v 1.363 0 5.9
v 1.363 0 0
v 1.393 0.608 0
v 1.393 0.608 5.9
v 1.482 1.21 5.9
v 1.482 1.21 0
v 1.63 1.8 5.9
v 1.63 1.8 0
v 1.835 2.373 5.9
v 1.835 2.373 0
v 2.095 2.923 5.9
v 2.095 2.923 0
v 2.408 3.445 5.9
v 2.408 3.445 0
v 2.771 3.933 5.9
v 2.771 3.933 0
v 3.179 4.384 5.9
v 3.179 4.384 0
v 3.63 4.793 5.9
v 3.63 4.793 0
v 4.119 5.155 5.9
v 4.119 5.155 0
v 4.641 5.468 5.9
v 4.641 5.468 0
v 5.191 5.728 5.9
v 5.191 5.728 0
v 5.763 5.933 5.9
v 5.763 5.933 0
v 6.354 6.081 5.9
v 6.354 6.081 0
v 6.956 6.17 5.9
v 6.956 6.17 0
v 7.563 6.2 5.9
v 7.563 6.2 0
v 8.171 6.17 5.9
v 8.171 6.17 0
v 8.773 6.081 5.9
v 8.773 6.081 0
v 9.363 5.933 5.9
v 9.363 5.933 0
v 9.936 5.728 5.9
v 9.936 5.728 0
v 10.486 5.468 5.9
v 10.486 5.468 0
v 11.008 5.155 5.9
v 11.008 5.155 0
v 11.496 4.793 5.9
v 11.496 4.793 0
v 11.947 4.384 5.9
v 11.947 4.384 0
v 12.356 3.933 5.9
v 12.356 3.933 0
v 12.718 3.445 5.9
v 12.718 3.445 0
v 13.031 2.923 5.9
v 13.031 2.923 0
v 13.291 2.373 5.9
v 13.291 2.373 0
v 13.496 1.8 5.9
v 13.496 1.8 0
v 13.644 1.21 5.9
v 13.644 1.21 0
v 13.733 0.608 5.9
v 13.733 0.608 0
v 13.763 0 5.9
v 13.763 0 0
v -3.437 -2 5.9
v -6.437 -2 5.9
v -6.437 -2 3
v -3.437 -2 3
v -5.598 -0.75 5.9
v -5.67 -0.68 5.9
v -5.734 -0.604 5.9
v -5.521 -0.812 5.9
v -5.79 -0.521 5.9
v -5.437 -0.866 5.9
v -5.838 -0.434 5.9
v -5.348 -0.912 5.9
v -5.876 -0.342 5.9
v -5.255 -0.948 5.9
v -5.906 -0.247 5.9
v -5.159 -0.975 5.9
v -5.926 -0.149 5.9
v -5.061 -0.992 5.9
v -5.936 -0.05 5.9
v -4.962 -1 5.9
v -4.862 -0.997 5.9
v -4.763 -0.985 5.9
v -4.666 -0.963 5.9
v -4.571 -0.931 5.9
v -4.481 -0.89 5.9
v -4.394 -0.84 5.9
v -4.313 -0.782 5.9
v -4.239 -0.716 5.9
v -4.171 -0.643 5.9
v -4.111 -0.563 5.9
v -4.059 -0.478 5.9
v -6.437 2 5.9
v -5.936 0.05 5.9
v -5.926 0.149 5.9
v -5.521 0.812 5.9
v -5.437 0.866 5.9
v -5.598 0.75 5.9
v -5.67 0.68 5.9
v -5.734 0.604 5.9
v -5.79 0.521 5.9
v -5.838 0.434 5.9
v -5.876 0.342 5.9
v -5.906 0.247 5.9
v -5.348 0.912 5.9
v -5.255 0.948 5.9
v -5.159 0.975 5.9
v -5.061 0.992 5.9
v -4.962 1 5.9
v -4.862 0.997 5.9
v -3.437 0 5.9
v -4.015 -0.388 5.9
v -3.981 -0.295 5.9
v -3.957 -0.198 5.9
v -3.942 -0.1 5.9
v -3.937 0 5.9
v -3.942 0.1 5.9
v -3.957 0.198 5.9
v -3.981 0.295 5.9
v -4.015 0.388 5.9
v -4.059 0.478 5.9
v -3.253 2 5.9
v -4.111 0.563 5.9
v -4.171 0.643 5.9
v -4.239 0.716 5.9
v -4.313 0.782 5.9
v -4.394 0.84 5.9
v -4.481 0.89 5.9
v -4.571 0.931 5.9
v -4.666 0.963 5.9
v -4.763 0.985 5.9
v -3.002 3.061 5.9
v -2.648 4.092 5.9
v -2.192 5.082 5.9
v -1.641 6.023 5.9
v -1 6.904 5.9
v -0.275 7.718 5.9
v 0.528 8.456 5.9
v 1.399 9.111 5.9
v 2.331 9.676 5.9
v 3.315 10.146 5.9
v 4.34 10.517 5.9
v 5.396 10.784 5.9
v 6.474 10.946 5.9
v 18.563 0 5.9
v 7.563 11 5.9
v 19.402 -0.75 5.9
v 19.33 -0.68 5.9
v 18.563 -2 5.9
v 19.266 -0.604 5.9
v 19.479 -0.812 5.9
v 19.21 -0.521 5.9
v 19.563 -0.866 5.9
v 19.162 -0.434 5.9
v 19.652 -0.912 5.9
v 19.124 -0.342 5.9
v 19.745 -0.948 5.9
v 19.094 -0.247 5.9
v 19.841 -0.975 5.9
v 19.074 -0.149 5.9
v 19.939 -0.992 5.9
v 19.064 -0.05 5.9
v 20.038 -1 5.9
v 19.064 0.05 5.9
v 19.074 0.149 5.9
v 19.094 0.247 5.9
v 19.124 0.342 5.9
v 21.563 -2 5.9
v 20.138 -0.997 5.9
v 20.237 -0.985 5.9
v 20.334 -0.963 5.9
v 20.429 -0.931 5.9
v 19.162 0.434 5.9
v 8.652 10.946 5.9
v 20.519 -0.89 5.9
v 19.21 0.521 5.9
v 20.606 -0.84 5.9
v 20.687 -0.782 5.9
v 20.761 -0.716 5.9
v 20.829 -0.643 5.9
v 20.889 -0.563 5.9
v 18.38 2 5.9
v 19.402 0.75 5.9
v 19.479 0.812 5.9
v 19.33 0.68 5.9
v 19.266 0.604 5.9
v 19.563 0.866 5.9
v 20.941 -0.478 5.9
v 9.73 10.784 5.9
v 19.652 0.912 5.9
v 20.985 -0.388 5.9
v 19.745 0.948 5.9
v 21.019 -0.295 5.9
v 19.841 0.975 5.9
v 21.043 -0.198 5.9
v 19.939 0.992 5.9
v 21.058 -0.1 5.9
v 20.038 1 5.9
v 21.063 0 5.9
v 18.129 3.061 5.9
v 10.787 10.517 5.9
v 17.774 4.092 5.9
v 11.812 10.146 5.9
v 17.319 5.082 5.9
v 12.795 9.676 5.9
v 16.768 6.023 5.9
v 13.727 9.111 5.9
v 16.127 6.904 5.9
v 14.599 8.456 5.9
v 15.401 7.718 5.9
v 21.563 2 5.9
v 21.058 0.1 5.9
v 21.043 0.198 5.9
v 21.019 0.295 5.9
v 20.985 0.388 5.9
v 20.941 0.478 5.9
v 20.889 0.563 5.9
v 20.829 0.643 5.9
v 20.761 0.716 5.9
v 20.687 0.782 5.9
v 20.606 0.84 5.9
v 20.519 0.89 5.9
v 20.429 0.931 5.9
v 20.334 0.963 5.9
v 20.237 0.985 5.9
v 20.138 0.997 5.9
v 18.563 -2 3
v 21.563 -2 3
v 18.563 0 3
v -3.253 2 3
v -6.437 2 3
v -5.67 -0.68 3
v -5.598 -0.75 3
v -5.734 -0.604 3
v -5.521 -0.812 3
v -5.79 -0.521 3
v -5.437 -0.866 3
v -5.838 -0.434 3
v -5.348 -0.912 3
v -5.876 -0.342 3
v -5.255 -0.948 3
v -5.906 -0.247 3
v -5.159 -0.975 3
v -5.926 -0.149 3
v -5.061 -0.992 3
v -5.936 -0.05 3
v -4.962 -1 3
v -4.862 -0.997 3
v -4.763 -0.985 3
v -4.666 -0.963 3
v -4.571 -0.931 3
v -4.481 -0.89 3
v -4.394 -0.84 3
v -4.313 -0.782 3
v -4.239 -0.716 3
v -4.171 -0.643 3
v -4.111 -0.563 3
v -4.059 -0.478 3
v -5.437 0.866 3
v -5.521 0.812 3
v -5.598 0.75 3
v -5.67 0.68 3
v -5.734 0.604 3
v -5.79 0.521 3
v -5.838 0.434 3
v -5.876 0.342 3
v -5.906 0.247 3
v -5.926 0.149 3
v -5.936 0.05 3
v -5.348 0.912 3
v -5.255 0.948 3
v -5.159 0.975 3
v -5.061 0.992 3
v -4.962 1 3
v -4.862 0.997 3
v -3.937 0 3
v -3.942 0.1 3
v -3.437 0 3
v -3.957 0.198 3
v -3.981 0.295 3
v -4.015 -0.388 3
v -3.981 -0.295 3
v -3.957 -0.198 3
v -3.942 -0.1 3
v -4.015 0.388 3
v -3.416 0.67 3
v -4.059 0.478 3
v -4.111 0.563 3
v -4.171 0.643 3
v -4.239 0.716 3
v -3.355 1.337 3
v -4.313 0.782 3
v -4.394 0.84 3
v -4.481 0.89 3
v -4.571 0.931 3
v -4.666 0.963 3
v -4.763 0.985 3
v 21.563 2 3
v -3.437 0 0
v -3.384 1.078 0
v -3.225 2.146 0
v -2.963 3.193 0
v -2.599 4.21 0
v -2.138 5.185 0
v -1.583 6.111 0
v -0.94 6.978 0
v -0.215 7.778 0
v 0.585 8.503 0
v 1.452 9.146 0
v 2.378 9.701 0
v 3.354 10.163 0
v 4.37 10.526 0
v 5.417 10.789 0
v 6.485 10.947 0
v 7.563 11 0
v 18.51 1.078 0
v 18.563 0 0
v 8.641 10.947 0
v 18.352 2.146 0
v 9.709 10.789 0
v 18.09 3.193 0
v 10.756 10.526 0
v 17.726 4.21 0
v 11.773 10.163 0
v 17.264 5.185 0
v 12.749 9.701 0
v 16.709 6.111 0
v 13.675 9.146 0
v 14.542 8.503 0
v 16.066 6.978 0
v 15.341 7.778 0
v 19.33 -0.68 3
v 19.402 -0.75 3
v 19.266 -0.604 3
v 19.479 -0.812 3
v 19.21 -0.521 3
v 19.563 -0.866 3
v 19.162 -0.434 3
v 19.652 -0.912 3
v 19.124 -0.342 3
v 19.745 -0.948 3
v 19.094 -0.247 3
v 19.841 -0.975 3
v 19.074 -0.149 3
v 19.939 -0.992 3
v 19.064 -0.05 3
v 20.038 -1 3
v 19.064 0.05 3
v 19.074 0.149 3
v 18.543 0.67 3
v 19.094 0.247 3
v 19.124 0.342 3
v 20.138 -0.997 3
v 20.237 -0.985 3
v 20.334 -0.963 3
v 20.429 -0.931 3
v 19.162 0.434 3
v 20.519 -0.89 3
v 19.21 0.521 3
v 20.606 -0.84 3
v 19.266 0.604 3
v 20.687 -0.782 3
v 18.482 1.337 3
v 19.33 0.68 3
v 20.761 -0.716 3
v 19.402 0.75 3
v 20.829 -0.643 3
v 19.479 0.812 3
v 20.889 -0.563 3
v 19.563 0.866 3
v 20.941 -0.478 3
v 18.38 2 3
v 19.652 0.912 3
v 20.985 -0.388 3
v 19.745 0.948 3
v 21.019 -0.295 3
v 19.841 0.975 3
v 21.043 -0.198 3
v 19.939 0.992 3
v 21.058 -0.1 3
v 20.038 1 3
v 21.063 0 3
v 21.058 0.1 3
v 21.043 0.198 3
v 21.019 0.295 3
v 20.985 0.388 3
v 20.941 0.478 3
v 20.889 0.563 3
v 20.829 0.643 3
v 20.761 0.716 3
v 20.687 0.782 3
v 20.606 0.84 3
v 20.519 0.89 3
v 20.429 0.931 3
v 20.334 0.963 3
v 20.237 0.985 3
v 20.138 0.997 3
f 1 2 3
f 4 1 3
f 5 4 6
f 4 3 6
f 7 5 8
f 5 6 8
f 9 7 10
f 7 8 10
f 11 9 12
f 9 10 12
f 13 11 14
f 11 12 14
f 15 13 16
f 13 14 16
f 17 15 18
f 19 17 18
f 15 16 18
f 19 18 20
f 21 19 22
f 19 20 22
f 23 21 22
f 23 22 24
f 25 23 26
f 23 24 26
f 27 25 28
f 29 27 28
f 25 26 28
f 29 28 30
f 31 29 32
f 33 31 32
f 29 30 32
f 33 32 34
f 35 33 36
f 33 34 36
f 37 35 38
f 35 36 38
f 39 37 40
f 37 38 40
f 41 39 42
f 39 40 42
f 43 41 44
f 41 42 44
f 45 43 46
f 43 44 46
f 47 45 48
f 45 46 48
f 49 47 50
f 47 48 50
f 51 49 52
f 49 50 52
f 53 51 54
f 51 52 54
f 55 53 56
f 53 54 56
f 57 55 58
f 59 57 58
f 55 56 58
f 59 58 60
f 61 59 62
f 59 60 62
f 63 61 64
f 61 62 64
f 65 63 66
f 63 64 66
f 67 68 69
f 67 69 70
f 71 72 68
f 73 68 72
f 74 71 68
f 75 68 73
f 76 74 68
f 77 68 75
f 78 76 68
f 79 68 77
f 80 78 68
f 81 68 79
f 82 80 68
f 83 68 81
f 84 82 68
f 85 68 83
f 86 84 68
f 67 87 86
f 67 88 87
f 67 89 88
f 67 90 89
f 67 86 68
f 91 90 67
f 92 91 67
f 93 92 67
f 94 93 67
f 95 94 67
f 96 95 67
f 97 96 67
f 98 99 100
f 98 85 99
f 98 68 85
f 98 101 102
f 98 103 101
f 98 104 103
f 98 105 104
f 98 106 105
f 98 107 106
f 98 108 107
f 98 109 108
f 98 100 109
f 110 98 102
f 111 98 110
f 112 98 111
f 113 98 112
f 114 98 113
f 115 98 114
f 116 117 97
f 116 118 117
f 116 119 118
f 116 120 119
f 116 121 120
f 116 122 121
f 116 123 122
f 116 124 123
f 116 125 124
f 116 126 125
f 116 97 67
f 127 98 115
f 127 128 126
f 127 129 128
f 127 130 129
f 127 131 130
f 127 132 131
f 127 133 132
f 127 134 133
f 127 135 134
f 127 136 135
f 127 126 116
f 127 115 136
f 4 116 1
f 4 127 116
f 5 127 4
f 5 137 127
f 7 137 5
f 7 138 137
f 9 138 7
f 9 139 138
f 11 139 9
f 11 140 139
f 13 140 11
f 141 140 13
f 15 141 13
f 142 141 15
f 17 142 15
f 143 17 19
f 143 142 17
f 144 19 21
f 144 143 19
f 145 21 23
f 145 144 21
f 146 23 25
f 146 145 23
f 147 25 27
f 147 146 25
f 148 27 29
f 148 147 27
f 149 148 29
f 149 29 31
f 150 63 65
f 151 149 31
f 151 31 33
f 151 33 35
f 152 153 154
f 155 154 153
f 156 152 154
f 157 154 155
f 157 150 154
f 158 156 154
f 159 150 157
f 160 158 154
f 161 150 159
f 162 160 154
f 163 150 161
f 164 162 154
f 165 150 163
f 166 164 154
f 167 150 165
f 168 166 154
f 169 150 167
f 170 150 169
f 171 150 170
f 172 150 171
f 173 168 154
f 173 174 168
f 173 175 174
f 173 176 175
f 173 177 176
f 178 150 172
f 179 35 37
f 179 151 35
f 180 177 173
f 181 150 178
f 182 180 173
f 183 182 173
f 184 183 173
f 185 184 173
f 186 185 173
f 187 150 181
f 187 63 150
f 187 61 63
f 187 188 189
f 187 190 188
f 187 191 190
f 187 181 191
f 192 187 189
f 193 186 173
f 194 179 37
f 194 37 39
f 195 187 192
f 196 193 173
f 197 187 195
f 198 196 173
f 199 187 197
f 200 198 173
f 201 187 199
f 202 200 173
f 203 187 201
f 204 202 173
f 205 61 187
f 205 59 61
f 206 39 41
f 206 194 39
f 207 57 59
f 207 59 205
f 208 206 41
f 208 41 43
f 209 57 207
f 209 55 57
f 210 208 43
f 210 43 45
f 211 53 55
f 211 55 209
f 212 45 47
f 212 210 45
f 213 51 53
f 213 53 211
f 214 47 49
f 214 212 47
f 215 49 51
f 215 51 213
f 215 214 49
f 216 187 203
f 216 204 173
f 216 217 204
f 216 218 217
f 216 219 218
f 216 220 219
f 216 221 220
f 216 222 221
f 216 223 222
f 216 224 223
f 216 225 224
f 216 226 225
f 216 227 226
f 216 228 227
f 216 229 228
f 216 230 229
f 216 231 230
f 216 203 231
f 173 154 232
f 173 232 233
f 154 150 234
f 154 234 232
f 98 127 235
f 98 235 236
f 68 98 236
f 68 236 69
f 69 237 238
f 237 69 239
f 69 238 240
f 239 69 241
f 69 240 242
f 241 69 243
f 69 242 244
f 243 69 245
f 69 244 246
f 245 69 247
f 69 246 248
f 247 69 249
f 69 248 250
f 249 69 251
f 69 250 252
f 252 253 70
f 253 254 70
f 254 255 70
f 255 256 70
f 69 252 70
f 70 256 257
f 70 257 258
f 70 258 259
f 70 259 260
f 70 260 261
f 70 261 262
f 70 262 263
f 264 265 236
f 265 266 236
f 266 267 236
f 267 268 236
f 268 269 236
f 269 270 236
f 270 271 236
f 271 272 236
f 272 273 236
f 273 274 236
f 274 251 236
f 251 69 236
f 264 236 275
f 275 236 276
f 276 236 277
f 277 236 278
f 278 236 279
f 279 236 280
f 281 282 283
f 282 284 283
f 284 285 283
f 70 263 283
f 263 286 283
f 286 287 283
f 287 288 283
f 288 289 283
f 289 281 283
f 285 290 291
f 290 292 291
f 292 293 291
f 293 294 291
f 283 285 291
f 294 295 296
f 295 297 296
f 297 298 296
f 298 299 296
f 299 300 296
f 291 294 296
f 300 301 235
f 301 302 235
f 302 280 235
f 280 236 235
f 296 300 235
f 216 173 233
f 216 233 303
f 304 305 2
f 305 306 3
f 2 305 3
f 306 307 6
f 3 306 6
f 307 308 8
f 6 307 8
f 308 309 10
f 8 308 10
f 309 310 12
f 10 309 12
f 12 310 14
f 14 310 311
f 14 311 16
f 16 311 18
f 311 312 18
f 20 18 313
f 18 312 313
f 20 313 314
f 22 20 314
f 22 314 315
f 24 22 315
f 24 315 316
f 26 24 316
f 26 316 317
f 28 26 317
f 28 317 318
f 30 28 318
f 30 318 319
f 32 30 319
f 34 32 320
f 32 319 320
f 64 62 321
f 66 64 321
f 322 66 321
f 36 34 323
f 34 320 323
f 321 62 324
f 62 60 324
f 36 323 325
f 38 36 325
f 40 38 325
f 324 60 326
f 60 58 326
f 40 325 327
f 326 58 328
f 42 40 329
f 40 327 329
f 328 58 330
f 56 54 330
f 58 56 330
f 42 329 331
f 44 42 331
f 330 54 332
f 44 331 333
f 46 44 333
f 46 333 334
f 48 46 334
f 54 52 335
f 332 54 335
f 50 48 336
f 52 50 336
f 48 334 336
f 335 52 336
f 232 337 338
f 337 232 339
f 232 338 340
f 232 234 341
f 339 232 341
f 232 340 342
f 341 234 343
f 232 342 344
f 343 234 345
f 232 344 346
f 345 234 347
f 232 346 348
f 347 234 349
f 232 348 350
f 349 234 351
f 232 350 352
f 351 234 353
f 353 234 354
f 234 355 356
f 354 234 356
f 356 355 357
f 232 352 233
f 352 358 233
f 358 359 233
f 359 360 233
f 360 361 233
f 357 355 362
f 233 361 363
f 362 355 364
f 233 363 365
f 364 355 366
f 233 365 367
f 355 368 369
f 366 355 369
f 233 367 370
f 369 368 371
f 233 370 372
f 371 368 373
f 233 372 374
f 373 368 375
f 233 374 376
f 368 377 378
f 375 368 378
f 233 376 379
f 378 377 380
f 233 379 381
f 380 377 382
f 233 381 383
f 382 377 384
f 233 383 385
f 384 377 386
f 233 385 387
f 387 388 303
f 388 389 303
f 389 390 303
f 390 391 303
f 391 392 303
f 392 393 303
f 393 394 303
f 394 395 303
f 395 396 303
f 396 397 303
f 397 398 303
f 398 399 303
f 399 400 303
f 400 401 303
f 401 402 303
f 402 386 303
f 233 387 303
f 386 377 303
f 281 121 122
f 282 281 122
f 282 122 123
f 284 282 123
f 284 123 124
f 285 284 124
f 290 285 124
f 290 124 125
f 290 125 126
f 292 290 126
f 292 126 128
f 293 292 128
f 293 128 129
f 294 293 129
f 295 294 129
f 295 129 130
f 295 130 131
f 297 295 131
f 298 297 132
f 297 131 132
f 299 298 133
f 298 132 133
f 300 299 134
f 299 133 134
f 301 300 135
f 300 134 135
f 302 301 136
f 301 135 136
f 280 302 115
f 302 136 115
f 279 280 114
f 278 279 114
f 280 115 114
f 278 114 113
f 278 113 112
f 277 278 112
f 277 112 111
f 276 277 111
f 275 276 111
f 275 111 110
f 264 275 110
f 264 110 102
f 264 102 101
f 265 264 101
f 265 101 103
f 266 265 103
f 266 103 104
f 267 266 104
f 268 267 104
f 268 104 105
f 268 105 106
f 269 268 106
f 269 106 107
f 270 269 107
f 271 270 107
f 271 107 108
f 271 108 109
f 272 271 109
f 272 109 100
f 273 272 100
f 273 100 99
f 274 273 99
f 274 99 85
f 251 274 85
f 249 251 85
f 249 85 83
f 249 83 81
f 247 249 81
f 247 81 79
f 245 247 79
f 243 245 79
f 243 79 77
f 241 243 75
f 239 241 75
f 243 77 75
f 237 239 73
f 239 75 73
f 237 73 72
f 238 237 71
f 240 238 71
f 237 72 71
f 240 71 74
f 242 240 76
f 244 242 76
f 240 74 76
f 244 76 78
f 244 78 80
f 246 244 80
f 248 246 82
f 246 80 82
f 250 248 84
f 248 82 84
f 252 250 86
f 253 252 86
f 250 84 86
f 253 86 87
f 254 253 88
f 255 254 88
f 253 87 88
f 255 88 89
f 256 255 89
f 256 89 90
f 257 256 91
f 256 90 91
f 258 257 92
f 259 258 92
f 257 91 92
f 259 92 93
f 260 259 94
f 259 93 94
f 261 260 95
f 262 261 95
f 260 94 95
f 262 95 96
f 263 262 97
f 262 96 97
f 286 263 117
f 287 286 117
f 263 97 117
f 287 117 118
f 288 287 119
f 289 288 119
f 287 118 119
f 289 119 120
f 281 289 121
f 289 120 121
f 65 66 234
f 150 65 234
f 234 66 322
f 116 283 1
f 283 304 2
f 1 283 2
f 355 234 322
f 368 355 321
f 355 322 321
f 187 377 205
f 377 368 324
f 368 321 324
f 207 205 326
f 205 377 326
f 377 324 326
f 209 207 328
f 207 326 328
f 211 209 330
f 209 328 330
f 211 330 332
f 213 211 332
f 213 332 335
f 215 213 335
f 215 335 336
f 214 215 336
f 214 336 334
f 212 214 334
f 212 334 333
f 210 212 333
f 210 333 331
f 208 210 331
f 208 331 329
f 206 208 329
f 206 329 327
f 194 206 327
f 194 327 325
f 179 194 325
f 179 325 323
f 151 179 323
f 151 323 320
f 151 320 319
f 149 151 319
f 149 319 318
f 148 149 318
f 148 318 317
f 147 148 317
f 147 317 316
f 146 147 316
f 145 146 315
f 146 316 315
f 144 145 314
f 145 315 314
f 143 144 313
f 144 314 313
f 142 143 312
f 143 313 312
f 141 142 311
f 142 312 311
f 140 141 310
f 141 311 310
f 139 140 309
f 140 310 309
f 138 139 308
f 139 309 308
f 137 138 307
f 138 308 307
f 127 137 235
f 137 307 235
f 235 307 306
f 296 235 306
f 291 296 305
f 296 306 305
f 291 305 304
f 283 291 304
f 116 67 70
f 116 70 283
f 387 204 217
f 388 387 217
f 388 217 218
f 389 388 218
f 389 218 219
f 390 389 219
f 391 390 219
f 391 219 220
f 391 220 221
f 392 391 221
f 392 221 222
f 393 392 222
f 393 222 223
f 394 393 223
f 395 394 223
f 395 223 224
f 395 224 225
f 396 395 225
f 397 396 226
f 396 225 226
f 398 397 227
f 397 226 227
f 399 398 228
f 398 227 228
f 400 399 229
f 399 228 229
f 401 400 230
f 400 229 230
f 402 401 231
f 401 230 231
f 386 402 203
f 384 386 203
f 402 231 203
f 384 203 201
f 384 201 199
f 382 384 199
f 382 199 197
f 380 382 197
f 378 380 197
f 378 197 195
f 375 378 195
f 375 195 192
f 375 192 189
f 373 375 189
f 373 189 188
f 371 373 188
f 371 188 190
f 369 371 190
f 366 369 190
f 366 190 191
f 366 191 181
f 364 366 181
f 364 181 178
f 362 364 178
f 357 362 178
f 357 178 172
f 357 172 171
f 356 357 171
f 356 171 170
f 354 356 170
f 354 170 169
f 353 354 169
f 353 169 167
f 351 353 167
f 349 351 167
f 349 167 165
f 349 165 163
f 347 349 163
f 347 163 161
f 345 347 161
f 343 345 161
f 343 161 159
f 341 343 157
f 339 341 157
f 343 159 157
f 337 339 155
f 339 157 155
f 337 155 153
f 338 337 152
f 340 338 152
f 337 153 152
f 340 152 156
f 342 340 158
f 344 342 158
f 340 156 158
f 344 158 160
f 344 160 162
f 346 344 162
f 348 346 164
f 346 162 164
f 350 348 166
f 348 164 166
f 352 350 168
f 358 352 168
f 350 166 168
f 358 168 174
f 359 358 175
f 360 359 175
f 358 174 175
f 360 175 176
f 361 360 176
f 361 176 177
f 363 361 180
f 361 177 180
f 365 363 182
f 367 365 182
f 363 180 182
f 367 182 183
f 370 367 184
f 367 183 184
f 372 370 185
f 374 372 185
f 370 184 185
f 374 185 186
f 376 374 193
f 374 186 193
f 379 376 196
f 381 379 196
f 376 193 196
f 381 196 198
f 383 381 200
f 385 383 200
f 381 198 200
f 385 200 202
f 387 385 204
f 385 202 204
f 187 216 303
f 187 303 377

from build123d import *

# Parameters (mm, degrees)
RESSALTO_EXTRUS_O1_DEPTH = 5.9
RESSALTO_EXTRUS_O2_DEPTH = 2.9
ESBO_O3_R                = 1
CORTE_EXTRUS_O1_DEPTH    = 6.5


with BuildPart() as part:
    # Esboço1 → Ressalto-extrusão1 (new body)
    with BuildSketch(Plane.XY):
        with BuildLine():
            ThreePointArc((18.563238972, 0), (7.563238972, 11), (-3.436761028, 0))
            Line((-3.436761028, 0), (1.363238972, 0))
            ThreePointArc((1.363238972, 0), (7.563238972, 6.2), (13.763238972, 0))
            Line((13.763238972, 0), (18.563238972, 0))
        make_face()
    extrude(amount=RESSALTO_EXTRUS_O1_DEPTH)

    # Esboço2 → Ressalto-extrusão2 (add)
    with BuildSketch(Plane.XY.offset(5.9)):
        with BuildLine():
            ThreePointArc((-3.436761028, 0), (-3.390828585, 1.004193186), (-3.253414854, 2))
            Line((-3.253414854, 2), (-6.436761028, 2))
            Line((-6.436761028, 2), (-6.436761028, -2))
            Line((-6.436761028, -2), (-3.436761028, -2))
            Line((-3.436761028, -2), (-3.436761028, 0))
        make_face()
        with BuildLine():
            Line((-0.436761028, 2), (-3.253414854, 2))
            ThreePointArc((-3.253414854, 2), (-3.390828585, 1.004193186), (-3.436761028, 0))
            Line((-3.436761028, 0), (-0.436761028, 0))
            Line((-0.436761028, 0), (-0.436761028, 2))
        make_face()
        with BuildLine():
            ThreePointArc((18.379892799, 2), (18.517306529, 1.004193186), (18.563238972, 0))
            Line((18.563238972, 0), (18.563238972, -2))
            Line((18.563238972, -2), (21.563238972, -2))
            Line((21.563238972, -2), (21.563238972, 2))
            Line((21.563238972, 2), (18.379892799, 2))
        make_face()
        with BuildLine():
            Line((15.563238972, 0), (18.563238972, 0))
            ThreePointArc((18.563238972, 0), (18.517306529, 1.004193186), (18.379892799, 2))
            Line((18.379892799, 2), (15.563238972, 2))
            Line((15.563238972, 2), (15.563238972, 0))
        make_face()
    extrude(amount=-RESSALTO_EXTRUS_O2_DEPTH)

    # Esboço3 → Corte-extrusão1 (cut)
    with BuildSketch(Plane.XY.offset(5.9)):
        with Locations((20.063238972, 0)):
            Circle(ESBO_O3_R)
        with Locations((-4.936761028, 0)):
            Circle(ESBO_O3_R)
    extrude(amount=-CORTE_EXTRUS_O1_DEPTH, mode=Mode.SUBTRACT)


solid = part.part
